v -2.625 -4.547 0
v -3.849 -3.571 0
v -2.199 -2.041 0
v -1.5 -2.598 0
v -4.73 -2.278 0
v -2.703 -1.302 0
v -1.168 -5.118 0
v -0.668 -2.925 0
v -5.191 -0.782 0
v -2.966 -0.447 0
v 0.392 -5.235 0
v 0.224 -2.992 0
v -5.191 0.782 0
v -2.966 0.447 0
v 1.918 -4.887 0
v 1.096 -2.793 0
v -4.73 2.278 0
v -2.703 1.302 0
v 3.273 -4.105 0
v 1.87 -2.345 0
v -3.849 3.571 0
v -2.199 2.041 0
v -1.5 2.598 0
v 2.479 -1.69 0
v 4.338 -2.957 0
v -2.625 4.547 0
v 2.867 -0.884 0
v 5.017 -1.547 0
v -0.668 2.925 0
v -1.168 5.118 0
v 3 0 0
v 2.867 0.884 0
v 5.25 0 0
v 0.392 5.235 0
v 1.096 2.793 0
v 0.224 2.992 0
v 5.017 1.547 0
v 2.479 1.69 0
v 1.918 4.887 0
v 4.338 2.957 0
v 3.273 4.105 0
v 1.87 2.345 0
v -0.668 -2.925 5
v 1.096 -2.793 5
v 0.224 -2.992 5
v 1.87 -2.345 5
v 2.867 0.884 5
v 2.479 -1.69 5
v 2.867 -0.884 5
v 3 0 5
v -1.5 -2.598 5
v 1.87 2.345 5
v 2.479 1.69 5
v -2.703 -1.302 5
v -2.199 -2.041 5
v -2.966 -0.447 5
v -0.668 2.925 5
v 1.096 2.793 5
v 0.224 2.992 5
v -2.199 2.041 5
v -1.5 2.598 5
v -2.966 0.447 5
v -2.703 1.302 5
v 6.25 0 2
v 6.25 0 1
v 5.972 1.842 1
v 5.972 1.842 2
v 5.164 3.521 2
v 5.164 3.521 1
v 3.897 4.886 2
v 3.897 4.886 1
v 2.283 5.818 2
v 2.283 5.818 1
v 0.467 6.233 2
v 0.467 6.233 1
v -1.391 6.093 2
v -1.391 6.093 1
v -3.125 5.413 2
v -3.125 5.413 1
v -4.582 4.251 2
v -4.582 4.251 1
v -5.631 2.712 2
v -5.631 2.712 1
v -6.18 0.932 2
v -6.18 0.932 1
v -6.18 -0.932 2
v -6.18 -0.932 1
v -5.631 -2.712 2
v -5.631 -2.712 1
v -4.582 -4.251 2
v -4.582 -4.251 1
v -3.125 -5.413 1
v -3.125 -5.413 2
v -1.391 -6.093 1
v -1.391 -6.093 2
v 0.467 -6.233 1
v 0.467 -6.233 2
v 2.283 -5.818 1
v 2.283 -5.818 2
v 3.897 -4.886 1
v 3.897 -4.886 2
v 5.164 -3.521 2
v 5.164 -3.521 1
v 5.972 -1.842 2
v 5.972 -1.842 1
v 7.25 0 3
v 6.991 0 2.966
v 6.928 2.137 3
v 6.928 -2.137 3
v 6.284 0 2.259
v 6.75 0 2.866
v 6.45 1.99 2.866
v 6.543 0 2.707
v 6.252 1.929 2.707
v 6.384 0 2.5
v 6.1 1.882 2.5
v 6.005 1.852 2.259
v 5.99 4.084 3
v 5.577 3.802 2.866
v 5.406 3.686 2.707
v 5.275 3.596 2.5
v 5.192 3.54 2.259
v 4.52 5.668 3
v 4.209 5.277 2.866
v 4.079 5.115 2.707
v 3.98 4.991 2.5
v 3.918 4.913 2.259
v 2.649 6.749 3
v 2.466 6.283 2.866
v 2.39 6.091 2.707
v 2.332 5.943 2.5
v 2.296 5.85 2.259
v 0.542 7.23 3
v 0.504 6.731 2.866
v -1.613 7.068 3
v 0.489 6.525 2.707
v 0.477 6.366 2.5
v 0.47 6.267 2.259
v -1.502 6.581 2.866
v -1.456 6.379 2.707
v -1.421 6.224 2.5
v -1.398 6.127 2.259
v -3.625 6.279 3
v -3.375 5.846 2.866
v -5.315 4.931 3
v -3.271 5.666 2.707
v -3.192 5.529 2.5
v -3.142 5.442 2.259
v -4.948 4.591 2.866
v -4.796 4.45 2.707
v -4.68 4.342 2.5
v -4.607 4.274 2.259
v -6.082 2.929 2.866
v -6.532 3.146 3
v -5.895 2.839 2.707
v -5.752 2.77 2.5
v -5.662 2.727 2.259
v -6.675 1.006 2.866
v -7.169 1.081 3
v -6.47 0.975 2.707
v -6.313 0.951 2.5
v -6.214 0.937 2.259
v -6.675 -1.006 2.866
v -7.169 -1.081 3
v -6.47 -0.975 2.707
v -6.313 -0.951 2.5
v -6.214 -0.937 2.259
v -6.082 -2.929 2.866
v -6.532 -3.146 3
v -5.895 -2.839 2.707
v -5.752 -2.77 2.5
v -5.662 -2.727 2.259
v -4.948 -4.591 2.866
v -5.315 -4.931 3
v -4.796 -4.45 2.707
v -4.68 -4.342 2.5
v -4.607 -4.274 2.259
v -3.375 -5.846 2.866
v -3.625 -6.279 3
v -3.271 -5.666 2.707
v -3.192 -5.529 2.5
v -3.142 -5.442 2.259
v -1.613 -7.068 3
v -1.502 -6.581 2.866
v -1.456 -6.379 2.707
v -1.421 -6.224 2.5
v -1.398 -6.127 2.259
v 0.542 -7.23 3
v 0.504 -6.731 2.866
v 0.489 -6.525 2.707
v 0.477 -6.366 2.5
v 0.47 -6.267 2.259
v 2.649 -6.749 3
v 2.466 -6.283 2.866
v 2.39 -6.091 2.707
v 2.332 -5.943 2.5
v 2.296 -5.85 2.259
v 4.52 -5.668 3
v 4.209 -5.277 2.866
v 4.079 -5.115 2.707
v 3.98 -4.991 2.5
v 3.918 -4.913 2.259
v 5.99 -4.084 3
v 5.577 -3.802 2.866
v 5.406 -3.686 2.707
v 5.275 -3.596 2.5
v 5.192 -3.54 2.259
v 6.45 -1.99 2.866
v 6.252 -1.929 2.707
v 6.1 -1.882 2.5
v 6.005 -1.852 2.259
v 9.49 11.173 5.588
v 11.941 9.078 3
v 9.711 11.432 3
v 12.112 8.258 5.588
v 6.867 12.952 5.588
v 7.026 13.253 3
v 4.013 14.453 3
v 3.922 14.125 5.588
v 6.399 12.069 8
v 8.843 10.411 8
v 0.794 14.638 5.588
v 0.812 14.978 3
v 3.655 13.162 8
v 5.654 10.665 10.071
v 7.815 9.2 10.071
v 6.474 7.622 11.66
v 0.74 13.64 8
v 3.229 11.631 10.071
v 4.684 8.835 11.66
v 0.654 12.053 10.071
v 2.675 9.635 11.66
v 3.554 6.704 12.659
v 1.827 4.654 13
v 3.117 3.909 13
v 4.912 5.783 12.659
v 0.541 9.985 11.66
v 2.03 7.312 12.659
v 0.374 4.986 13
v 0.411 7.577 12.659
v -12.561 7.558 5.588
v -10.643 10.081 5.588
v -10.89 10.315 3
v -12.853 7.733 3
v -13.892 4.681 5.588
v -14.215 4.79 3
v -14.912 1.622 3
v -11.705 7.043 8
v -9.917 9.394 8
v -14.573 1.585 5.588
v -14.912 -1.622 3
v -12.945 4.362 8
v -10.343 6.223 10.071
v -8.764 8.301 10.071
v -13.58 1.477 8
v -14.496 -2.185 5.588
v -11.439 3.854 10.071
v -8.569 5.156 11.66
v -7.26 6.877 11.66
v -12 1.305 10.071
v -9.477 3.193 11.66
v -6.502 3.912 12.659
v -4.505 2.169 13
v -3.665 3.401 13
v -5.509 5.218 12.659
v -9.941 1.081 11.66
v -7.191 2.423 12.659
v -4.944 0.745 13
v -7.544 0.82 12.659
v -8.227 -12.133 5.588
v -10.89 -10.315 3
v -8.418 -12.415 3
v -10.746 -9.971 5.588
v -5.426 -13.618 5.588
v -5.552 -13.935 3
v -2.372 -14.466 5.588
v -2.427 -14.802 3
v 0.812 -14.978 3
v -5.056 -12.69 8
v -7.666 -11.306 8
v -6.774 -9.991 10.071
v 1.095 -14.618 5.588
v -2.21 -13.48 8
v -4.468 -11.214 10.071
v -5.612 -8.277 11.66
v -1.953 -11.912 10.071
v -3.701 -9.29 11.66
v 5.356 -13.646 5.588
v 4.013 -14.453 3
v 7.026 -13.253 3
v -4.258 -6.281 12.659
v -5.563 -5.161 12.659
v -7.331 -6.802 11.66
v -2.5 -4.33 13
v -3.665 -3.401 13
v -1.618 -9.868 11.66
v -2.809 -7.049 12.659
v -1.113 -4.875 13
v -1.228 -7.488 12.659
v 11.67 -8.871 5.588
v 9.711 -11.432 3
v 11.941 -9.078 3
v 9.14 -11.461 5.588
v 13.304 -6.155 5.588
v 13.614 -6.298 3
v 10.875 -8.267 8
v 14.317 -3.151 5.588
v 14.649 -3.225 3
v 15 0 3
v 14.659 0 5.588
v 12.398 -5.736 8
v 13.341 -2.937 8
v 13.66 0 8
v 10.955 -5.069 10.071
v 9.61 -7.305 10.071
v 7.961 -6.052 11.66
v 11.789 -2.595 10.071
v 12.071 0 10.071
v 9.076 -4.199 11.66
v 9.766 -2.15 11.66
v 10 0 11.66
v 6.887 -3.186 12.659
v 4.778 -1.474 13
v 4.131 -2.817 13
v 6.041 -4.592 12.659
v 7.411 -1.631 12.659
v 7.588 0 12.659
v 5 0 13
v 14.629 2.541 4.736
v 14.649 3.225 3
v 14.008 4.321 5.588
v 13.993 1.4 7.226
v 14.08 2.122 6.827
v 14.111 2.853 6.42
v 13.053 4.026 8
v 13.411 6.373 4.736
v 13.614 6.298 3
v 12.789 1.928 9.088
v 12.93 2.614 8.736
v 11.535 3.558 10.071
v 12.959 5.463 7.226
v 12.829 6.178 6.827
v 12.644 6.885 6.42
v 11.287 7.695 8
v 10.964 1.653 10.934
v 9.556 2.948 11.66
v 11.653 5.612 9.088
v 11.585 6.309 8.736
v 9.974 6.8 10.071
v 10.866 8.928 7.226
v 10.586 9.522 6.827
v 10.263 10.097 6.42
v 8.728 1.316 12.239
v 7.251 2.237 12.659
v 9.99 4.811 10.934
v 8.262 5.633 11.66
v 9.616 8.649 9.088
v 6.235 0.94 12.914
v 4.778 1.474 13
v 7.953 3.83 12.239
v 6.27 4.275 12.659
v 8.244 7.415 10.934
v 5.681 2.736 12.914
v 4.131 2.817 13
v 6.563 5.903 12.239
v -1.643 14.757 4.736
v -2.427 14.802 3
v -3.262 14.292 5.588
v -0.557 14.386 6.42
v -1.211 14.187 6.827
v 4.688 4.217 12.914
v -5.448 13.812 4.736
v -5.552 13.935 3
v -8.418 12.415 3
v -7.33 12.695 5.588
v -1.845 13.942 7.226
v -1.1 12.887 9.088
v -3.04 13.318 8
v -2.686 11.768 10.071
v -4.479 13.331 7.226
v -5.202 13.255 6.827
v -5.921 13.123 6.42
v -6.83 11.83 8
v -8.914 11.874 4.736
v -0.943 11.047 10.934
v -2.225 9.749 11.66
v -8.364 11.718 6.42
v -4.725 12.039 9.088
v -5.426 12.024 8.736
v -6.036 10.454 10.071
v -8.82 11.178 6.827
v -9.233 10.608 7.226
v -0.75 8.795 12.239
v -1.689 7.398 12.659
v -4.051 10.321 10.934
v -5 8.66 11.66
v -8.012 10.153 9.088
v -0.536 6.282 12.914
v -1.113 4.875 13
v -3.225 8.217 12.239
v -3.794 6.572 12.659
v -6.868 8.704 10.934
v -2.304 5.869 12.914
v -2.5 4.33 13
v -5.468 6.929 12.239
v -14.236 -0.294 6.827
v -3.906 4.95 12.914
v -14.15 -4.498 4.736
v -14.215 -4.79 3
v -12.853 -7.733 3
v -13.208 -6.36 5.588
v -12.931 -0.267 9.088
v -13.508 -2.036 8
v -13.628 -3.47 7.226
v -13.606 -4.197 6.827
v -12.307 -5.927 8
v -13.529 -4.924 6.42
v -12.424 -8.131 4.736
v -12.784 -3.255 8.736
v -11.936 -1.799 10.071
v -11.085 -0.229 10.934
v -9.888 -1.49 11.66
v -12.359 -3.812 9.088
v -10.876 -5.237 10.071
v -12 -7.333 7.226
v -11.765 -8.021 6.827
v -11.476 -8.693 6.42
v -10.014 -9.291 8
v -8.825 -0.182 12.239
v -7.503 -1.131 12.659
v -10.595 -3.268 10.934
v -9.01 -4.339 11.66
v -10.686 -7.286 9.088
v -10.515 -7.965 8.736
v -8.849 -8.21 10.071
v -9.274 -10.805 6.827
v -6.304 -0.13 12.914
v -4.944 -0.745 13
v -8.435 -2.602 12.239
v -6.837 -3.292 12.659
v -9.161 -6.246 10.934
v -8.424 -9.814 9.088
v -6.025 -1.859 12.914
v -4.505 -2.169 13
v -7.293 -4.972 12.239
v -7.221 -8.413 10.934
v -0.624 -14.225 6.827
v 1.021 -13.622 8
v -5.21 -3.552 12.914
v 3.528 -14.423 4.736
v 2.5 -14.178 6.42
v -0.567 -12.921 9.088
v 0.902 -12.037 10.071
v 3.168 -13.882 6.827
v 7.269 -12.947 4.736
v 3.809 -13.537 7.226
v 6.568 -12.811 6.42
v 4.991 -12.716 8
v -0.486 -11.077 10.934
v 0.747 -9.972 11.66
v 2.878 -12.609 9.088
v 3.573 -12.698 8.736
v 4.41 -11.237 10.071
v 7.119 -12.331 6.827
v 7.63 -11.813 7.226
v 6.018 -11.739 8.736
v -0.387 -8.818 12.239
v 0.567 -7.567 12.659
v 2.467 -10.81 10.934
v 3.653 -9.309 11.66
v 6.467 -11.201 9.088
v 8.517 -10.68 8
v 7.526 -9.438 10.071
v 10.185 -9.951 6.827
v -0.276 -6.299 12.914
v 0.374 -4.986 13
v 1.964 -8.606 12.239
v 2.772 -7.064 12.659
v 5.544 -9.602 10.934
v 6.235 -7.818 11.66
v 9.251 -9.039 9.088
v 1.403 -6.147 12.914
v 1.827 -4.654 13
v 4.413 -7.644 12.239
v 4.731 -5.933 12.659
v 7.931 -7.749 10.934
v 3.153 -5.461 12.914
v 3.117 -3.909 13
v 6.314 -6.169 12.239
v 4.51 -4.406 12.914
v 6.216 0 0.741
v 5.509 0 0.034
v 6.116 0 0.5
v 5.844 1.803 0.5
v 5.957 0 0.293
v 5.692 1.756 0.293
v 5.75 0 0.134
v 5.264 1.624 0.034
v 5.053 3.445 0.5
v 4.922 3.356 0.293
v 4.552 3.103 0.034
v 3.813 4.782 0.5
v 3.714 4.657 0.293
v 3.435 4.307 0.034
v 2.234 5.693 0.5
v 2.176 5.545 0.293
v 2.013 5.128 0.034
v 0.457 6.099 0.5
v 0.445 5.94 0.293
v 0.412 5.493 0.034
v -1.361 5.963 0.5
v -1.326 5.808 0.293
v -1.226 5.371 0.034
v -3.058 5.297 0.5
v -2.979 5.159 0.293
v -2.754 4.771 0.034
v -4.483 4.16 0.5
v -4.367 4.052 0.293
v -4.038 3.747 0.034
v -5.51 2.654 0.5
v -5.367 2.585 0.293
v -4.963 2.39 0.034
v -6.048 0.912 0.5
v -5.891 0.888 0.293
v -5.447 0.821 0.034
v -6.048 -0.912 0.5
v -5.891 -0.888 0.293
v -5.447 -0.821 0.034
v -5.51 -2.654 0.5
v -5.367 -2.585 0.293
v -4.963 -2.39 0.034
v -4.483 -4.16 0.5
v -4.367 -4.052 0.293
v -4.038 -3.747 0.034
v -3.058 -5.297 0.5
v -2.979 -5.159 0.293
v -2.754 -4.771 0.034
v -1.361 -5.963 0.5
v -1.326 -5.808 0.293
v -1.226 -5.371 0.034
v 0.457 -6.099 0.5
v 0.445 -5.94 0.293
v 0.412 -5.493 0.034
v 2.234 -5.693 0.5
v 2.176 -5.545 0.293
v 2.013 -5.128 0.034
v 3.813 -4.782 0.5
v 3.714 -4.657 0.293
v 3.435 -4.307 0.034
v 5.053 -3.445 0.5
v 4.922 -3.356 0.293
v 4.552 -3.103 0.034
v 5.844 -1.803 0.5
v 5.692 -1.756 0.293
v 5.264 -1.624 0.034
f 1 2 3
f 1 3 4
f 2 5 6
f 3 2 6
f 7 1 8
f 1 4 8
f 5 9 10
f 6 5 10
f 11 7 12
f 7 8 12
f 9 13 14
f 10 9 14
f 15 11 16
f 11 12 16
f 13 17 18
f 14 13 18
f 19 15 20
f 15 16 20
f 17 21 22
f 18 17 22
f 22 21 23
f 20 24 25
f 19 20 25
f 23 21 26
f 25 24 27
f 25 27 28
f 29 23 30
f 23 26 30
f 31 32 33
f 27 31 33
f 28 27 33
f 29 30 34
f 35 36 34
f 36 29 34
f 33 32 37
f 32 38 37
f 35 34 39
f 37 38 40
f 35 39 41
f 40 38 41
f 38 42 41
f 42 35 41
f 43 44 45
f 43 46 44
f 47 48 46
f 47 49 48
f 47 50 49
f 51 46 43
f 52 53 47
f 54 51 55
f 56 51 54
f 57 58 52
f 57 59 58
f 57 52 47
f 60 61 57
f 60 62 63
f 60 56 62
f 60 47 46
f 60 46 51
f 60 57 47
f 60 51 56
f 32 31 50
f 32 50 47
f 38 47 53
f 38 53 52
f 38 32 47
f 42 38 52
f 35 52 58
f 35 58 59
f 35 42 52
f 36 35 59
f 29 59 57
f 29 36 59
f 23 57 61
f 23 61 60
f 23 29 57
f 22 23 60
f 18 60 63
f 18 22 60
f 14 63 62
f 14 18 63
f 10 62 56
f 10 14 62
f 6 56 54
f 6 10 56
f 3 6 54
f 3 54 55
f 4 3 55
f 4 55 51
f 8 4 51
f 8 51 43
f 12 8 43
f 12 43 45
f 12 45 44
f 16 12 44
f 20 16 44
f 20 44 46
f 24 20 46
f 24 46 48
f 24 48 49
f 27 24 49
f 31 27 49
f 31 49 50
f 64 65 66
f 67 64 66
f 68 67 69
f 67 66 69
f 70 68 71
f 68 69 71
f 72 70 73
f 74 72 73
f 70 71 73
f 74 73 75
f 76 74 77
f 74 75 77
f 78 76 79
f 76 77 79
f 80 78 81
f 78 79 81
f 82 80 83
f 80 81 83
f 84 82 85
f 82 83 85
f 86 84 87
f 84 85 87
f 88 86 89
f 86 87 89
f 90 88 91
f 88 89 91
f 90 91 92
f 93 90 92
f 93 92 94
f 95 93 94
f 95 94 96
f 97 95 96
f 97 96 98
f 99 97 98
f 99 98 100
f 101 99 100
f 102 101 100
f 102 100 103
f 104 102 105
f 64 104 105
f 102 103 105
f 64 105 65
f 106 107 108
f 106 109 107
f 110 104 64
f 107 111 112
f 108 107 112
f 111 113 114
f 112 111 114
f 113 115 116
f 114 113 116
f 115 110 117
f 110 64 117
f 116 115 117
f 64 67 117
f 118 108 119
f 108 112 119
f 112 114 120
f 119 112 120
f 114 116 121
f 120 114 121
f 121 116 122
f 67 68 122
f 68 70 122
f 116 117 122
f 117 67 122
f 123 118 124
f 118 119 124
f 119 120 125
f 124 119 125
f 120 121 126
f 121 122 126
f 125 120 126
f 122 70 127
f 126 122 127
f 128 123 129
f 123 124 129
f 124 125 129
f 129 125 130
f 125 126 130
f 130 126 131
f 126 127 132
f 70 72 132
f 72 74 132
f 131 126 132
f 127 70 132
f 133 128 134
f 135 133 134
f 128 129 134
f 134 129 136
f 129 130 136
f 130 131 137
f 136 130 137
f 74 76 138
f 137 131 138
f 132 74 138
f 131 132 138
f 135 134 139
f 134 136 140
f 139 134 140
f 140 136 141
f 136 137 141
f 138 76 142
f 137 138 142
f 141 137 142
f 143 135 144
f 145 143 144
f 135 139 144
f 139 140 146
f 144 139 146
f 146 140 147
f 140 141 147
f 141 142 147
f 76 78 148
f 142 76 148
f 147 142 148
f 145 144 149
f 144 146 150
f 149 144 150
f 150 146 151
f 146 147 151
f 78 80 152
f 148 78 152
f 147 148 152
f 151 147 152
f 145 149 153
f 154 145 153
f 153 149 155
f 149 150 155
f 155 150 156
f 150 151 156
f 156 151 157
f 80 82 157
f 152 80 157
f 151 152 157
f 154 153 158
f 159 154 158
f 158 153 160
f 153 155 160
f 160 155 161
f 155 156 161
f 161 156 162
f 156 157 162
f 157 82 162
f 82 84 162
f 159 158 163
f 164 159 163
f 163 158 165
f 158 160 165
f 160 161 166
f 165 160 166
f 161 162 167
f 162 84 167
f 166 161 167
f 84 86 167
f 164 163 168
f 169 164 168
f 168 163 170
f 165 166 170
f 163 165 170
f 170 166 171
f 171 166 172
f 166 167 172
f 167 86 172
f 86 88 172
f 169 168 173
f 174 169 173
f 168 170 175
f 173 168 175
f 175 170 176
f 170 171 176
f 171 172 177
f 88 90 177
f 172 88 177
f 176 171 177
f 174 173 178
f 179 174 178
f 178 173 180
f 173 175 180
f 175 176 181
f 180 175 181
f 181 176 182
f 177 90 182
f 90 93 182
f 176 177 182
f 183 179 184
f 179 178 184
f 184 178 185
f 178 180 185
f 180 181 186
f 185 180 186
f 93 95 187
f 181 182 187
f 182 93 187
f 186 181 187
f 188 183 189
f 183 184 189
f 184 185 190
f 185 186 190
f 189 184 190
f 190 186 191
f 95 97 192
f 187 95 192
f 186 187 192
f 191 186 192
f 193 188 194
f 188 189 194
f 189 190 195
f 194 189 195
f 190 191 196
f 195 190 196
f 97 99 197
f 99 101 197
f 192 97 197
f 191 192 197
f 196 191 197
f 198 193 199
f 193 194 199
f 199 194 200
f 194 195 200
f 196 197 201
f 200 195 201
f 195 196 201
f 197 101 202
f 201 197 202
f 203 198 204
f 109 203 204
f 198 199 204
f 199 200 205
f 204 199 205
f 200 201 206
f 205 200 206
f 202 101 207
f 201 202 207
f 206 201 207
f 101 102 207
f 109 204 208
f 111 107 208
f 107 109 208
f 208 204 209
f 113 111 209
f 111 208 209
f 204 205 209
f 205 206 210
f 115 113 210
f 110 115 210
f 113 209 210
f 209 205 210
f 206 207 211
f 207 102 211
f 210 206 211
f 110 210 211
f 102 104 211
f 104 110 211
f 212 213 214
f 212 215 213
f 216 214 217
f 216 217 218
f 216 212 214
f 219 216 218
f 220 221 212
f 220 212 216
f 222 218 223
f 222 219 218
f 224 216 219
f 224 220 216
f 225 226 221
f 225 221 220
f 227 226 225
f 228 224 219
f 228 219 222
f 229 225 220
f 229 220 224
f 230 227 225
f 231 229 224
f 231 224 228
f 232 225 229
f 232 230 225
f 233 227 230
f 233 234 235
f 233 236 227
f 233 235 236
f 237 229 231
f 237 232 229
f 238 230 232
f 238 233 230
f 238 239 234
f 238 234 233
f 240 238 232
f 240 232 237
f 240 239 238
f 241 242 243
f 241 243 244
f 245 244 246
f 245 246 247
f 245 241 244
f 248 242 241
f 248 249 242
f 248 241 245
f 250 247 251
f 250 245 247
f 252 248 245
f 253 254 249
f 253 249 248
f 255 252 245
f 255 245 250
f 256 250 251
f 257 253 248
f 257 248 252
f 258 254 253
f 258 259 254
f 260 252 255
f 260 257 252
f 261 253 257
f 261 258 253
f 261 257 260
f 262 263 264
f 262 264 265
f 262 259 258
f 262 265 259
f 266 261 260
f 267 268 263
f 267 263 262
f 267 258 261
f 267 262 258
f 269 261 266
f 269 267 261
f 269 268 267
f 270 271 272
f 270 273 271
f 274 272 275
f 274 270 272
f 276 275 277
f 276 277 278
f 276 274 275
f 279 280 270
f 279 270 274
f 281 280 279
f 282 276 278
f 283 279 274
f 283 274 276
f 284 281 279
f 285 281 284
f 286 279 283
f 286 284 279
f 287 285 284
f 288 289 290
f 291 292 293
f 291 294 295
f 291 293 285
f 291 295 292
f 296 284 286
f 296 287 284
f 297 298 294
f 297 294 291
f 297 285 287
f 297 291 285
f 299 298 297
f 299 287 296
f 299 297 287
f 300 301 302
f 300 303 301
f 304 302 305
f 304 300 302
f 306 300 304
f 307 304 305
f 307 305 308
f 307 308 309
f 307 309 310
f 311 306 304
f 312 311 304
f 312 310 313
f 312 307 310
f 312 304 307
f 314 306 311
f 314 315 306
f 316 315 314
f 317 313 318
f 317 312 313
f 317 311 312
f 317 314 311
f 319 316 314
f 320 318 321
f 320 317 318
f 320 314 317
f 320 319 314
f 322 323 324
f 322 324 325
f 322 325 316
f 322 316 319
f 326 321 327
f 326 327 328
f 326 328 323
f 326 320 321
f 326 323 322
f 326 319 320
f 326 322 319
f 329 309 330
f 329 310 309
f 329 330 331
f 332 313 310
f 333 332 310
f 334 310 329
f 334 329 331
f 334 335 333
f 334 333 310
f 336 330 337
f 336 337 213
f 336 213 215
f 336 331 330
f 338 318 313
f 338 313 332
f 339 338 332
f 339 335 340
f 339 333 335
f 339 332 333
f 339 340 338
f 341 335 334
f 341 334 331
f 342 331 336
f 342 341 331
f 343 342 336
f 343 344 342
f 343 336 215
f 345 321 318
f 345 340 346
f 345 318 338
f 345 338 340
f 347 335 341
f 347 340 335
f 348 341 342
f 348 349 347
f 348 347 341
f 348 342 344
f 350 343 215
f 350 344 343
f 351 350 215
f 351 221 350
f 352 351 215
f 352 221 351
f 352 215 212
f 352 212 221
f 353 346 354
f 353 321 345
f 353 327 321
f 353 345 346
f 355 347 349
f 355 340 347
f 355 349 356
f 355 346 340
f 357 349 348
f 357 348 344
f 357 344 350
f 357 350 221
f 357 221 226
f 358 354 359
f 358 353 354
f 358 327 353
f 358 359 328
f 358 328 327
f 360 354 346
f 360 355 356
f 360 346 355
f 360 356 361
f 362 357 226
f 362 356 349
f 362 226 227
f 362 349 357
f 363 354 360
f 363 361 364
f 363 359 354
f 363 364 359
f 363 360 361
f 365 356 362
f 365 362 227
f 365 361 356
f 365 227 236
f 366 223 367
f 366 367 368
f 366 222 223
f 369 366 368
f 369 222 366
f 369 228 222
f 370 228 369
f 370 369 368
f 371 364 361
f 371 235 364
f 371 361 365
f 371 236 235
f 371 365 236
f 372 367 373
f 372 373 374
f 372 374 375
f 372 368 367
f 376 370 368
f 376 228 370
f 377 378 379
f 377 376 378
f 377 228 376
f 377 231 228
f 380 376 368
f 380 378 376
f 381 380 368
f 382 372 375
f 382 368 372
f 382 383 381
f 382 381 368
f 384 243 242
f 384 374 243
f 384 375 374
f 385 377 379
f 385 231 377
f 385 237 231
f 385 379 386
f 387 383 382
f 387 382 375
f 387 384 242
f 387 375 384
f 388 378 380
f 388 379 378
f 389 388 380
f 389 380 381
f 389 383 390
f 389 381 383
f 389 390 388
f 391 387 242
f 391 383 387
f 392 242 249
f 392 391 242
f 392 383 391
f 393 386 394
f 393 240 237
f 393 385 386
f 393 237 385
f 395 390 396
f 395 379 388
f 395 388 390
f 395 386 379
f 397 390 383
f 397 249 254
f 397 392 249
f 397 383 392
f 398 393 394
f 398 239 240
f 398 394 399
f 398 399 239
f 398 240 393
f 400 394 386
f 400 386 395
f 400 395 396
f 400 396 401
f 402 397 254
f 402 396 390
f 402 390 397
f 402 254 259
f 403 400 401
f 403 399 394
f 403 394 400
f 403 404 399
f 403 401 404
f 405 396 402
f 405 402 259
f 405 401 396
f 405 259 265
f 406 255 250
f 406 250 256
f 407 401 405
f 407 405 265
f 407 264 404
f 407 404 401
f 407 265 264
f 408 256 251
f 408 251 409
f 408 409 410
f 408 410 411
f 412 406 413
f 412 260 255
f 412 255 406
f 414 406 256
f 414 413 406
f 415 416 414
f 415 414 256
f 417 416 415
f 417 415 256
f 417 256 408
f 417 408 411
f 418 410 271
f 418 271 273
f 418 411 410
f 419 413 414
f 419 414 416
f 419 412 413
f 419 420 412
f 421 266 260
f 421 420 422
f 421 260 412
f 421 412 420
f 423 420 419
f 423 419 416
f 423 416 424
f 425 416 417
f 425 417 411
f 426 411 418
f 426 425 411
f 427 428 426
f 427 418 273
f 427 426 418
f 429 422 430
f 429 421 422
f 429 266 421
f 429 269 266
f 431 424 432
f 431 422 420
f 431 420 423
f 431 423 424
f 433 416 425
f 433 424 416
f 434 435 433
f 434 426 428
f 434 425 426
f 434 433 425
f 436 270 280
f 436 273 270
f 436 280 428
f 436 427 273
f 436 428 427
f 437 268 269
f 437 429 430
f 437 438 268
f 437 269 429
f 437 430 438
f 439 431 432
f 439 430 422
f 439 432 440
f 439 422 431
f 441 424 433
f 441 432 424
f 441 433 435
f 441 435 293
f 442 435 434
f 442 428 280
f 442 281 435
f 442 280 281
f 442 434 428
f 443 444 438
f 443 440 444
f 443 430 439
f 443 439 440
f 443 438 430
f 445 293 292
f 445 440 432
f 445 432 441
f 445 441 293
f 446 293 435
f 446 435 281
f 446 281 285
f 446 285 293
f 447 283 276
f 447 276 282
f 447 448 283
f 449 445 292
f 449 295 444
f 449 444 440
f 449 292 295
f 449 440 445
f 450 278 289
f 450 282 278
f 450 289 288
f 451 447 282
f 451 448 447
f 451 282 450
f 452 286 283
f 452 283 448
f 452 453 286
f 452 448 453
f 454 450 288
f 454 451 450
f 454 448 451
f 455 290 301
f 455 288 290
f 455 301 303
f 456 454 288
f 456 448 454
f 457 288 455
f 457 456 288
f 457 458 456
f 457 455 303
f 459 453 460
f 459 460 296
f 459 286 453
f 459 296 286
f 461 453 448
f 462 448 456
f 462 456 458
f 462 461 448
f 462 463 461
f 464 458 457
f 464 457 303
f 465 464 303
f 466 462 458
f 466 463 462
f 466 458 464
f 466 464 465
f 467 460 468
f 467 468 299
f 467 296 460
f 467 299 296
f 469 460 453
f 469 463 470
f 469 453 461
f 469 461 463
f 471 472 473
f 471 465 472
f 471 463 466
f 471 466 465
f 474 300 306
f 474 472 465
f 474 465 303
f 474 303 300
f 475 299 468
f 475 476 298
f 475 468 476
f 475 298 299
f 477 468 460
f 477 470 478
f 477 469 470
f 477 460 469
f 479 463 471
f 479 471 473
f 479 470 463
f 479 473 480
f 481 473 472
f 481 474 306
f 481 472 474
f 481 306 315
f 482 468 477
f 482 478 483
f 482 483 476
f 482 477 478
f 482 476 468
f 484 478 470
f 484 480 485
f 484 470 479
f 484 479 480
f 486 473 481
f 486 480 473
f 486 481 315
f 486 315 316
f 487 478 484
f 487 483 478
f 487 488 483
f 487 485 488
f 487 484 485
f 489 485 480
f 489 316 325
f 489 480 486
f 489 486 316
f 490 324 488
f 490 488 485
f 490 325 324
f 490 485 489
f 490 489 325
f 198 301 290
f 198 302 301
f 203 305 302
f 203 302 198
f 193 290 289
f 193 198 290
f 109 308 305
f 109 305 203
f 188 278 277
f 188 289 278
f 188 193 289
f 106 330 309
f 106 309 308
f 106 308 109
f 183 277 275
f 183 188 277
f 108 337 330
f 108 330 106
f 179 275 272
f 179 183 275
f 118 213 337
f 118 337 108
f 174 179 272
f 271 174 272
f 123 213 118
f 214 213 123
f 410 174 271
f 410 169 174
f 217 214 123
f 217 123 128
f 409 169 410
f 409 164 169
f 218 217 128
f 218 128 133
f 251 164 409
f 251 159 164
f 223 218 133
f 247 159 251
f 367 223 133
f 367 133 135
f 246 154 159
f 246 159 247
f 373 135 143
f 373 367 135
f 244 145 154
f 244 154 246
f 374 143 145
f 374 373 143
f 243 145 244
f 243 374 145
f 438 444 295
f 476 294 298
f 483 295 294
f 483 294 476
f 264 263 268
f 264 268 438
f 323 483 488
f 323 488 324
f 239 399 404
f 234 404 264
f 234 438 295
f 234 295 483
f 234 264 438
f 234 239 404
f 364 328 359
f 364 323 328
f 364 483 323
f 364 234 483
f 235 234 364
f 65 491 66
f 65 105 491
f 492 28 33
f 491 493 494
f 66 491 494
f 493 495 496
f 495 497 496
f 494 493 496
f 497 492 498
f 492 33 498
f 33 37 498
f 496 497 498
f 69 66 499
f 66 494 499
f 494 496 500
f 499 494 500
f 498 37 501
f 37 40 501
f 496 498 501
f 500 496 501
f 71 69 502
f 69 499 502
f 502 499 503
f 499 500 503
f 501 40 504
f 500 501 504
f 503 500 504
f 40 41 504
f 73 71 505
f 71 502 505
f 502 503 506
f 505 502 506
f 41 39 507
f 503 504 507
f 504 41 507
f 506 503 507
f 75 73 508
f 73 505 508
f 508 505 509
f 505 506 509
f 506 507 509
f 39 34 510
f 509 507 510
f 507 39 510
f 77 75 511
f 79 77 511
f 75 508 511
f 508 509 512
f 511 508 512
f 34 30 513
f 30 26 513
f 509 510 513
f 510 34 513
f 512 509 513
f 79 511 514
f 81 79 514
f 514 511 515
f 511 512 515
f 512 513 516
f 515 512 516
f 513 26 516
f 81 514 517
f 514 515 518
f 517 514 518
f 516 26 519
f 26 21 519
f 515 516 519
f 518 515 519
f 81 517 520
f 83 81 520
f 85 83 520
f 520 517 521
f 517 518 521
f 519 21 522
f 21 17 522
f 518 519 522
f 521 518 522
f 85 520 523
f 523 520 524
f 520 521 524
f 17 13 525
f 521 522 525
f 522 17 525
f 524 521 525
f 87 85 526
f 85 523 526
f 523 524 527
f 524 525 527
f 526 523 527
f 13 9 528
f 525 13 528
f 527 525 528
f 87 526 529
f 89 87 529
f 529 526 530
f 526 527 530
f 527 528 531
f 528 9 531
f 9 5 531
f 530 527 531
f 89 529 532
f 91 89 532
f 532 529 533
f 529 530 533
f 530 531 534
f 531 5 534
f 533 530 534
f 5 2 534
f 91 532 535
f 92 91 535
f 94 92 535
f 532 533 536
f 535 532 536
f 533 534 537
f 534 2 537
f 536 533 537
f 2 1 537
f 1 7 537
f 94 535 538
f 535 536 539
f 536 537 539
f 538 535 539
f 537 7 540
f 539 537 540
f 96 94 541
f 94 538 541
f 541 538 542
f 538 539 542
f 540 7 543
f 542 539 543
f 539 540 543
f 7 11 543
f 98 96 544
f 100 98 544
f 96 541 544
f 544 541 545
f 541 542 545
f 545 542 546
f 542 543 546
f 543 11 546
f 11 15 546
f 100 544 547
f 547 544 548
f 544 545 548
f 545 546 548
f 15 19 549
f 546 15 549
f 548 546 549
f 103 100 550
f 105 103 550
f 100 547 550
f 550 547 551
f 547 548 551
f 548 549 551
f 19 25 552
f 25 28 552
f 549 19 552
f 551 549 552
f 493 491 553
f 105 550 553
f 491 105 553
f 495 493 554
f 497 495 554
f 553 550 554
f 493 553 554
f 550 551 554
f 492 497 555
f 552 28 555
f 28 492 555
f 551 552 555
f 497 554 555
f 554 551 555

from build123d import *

# Parameters (mm, degrees)
F0_R     = 6.25
F0_R_2   = 3
F1_DEPTH = 3
F4_R     = 1
F5_DEPTH = 2


# Not quite as in the source:
# - a feature names something its author has since deleted; it is built from what else it names


with BuildPart() as f1:
    # F0 (on Top) → F1 (new body)
    with BuildSketch(Plane.XY):
        Circle(F0_R)
        Circle(F0_R_2, mode=Mode.SUBTRACT)
    extrude(amount=F1_DEPTH)

    # F2 (on Front) → F3 (revolve)
    with BuildSketch(Plane.XZ):
        with BuildLine():
            Line((5, 13), (0, 13))
            Line((0, 13), (0, 3))
            Line((0, 3), (15, 3))
            ThreePointArc((15, 3), (12.0710678119, 10.0710678119), (5, 13))
        make_face()
    revolve(axis=Axis((0, 0, 6.5), (0, 0, 1)))

    # F4
    f4_edges = [f1.edges().sort_by_distance(p)[0] for p in [
        (-6.25, 0, 0),
        (-6.25, 0, 3),
    ]]
    fillet(f4_edges, radius=F4_R)

    # F5 (cut): a face of the model
    f5_faces = [f1.faces().sort_by_distance(p)[0] for p in [
        (0, 0, 3),
    ]]
    extrude(f5_faces, amount=-F5_DEPTH, mode=Mode.SUBTRACT)


solid = f1.part
